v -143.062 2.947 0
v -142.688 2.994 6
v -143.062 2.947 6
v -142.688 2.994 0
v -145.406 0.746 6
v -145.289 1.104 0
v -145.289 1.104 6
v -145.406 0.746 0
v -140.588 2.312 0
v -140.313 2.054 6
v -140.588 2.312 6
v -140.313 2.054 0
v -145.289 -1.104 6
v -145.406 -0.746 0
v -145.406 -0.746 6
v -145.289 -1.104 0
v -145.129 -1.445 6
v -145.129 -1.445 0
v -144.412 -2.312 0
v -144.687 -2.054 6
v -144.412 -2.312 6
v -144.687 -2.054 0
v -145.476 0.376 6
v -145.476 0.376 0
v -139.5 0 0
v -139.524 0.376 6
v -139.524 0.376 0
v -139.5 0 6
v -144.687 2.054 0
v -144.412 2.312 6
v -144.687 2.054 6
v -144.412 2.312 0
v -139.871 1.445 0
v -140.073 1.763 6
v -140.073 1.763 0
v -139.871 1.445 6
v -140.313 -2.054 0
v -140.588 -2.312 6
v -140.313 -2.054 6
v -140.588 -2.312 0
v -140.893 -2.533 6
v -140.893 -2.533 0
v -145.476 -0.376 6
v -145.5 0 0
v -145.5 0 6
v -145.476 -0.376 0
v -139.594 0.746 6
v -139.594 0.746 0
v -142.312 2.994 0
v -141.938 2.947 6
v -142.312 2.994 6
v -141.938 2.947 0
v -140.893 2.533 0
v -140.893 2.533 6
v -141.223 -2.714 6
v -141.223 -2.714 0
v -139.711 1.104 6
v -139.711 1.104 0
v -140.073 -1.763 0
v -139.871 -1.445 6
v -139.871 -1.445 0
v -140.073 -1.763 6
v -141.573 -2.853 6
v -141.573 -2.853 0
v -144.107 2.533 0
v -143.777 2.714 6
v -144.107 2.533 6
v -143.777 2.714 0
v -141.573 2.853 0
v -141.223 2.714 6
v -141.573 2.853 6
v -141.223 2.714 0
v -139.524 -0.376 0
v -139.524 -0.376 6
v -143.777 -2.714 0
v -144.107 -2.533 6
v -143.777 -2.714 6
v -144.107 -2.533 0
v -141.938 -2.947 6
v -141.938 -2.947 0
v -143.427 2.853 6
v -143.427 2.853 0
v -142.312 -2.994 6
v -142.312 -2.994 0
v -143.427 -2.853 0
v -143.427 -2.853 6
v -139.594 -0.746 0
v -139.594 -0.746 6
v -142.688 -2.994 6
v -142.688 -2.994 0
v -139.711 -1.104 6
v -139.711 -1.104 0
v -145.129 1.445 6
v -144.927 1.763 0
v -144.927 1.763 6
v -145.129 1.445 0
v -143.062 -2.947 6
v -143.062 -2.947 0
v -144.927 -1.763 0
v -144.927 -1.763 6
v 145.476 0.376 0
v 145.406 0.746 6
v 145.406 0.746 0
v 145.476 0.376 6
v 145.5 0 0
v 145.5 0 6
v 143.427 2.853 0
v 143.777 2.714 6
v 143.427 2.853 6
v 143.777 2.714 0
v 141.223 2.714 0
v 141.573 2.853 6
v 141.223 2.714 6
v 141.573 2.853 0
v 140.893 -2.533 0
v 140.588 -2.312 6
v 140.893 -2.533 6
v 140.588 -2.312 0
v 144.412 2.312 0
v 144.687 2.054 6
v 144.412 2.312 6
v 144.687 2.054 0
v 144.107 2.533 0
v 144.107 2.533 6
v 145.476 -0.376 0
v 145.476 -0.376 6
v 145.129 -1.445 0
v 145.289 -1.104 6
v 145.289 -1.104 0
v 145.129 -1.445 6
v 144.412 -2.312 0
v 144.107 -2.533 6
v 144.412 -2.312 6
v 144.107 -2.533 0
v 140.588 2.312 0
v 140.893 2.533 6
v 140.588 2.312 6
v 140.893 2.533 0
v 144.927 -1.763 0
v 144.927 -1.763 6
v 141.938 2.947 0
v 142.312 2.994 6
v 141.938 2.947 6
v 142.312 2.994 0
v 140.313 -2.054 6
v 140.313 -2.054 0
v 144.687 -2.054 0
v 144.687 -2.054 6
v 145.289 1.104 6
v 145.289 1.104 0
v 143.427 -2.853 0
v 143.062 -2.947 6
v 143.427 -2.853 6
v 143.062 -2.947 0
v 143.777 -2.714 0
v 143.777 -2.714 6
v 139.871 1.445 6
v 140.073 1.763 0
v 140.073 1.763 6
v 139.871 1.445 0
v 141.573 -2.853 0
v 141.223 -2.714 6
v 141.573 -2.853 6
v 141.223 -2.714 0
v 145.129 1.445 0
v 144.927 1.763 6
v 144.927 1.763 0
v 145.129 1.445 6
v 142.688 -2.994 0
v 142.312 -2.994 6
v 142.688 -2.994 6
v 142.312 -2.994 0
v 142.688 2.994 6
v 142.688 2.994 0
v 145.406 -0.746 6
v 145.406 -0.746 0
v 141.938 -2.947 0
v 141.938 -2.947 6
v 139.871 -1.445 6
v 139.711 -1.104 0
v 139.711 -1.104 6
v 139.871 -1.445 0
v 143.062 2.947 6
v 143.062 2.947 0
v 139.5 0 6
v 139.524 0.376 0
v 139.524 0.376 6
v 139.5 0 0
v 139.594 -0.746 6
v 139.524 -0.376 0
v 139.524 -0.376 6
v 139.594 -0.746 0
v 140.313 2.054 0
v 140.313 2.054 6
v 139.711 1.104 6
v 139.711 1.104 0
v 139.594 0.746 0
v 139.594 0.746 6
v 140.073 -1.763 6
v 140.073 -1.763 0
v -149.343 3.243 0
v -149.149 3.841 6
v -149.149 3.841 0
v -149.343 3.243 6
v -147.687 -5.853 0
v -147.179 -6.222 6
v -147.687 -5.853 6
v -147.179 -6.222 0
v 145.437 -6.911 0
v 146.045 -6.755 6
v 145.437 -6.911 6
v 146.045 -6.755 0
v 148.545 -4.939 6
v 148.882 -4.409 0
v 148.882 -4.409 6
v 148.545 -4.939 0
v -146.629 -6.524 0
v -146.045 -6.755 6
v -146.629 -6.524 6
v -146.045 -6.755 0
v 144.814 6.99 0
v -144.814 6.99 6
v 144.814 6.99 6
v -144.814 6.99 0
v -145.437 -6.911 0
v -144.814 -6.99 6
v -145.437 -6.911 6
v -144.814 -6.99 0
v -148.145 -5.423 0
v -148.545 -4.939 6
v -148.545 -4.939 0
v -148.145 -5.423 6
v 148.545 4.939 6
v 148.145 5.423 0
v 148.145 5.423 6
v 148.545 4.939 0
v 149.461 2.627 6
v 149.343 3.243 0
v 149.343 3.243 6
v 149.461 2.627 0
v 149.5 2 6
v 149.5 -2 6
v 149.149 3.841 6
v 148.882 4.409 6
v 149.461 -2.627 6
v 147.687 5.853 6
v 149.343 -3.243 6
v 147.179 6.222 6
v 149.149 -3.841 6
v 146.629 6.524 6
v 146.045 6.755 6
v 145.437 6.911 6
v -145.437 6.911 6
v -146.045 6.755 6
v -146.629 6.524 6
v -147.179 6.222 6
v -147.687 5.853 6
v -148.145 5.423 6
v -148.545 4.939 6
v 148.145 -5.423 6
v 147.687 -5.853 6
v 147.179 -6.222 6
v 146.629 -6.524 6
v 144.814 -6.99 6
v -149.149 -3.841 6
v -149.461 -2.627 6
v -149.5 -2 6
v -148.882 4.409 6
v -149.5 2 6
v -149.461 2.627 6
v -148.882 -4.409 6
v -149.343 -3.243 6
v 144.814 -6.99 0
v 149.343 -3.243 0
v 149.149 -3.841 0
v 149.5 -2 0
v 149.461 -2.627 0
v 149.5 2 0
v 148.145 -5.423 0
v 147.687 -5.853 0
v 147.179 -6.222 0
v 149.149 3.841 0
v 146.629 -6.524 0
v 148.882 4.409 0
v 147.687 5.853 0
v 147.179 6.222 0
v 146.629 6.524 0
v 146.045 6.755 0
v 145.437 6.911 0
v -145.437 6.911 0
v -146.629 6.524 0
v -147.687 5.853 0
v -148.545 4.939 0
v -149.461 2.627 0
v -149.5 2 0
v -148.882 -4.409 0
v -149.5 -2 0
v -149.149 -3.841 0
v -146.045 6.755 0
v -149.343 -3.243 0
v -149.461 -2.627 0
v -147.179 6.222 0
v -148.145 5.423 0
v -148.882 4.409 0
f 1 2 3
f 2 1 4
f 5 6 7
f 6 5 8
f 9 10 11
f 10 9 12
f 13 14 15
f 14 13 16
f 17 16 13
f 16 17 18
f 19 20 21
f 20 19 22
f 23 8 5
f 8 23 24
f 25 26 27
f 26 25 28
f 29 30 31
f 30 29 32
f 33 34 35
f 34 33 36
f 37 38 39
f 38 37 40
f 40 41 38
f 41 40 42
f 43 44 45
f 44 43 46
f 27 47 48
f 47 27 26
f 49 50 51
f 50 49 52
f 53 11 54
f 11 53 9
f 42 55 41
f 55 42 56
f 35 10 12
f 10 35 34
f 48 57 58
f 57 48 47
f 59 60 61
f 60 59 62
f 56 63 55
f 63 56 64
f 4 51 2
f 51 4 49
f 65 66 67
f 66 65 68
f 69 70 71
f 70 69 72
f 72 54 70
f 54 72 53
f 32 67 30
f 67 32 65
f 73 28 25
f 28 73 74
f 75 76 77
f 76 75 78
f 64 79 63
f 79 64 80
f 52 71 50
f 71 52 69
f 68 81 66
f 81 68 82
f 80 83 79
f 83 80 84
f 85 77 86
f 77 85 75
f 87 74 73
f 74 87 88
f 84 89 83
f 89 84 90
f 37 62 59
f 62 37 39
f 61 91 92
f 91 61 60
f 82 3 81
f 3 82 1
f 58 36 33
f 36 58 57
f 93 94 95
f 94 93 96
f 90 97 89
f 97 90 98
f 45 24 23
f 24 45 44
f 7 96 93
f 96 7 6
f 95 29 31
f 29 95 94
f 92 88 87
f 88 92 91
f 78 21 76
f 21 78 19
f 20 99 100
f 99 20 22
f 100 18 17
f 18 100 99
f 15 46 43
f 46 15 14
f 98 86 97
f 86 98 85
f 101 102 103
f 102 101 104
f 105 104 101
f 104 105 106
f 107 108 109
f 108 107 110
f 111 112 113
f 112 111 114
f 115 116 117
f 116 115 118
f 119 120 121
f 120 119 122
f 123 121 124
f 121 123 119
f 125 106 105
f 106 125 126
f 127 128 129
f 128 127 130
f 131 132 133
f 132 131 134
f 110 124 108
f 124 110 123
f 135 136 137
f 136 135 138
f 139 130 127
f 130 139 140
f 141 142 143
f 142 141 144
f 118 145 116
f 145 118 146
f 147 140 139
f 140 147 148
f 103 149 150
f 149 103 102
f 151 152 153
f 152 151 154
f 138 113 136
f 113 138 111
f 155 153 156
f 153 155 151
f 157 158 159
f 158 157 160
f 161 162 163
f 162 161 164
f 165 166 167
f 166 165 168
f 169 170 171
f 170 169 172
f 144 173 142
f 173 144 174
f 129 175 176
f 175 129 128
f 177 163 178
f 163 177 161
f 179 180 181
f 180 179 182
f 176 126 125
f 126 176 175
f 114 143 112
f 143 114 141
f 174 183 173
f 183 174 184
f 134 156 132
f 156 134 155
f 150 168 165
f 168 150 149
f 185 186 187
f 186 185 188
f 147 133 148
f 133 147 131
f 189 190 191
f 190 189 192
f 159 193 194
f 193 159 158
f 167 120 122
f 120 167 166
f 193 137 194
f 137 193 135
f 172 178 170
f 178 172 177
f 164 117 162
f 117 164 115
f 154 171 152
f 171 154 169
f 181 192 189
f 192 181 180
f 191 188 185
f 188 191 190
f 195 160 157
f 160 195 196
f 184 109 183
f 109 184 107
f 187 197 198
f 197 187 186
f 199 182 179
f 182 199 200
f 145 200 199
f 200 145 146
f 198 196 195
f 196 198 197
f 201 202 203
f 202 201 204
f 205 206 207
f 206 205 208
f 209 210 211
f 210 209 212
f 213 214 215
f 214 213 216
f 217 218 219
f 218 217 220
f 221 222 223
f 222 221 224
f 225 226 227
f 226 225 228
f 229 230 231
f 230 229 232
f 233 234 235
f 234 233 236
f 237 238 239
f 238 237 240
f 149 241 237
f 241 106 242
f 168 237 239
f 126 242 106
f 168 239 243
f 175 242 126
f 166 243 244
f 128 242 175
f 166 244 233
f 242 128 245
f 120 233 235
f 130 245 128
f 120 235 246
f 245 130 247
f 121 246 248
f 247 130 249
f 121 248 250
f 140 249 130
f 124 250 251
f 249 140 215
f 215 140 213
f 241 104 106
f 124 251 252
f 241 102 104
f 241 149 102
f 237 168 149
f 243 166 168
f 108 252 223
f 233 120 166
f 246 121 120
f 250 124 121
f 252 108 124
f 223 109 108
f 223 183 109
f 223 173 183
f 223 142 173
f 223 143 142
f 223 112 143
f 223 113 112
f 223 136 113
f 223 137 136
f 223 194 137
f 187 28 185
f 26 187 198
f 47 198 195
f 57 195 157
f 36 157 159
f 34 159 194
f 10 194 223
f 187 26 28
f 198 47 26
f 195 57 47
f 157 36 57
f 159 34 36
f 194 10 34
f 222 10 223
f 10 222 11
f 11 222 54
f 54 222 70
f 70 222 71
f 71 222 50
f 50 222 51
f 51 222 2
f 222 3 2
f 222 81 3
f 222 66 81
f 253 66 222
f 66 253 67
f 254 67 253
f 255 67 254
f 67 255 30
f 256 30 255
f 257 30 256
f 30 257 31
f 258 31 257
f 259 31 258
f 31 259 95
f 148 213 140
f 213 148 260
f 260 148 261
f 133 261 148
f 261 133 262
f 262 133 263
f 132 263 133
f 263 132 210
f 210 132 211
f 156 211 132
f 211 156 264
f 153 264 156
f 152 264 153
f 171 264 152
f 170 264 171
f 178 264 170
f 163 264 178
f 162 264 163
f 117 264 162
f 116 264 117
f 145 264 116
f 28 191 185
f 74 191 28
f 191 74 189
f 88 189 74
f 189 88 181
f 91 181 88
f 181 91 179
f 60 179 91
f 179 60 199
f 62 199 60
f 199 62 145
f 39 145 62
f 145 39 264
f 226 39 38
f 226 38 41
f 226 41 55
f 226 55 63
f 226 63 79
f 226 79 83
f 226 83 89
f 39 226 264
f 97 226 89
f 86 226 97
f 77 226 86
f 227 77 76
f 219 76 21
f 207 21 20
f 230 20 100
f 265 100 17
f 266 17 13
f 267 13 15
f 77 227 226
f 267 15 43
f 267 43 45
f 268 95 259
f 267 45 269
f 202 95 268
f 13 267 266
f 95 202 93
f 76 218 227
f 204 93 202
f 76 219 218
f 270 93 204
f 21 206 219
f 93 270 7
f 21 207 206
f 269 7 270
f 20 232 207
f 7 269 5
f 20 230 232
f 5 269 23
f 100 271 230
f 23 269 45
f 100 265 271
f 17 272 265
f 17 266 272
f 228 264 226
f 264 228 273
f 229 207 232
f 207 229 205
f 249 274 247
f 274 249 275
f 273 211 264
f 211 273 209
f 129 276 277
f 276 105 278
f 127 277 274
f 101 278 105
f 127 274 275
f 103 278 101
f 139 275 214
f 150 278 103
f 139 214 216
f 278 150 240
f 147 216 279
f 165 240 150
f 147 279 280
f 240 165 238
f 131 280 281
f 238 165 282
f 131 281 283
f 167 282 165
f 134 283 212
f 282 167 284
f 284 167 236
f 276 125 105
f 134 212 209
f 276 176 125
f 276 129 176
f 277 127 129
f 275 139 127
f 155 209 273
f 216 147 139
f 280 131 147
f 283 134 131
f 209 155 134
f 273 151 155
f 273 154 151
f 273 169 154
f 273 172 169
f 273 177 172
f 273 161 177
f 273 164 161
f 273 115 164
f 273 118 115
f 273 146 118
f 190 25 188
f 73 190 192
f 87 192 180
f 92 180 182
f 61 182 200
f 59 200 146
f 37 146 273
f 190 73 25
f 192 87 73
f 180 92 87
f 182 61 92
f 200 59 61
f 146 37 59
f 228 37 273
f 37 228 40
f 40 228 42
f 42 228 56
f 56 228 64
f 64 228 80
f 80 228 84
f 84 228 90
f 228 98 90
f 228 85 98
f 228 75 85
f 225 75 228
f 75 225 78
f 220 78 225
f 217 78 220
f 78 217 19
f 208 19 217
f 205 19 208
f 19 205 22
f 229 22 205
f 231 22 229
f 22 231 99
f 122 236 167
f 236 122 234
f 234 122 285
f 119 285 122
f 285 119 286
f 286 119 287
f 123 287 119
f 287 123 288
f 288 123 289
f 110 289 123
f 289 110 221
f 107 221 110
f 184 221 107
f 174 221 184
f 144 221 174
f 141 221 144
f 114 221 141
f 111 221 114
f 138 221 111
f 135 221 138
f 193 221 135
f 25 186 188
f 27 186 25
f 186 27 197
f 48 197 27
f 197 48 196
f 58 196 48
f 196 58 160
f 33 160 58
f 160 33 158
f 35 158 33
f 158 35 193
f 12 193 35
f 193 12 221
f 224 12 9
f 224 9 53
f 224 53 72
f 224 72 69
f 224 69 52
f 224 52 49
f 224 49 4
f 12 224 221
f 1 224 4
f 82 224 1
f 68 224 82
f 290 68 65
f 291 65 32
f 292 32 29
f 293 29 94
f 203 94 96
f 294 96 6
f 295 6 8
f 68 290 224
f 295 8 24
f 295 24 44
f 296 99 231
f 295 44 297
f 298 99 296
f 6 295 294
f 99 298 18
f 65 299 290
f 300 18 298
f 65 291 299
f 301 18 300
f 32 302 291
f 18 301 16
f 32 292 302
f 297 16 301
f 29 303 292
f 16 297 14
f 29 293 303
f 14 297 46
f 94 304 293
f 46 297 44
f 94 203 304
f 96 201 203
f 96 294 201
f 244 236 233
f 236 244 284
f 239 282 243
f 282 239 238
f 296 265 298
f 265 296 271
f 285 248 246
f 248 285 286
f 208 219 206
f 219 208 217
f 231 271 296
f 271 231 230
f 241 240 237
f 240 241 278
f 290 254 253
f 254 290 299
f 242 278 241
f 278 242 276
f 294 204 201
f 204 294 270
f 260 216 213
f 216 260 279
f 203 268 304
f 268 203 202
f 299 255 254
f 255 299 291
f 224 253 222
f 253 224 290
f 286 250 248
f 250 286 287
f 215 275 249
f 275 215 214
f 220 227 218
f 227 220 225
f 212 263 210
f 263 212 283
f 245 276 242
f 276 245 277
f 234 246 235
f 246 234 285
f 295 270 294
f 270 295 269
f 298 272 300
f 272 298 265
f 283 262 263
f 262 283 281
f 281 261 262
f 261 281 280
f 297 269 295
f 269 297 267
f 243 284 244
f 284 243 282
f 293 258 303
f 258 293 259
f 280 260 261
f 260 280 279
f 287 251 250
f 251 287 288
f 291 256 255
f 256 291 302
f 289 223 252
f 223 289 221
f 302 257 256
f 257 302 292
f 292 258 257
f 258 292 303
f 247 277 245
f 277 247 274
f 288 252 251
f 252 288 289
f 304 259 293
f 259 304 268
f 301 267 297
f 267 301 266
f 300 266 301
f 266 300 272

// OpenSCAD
$fn = 50;


difference() {
	union() {
		hull() {
			translate(v = [-144.5000000000, 2.0000000000, 0]) {
				cylinder(h = 6, r = 5);
			}
			translate(v = [144.5000000000, 2.0000000000, 0]) {
				cylinder(h = 6, r = 5);
			}
			translate(v = [-144.5000000000, -2.0000000000, 0]) {
				cylinder(h = 6, r = 5);
			}
			translate(v = [144.5000000000, -2.0000000000, 0]) {
				cylinder(h = 6, r = 5);
			}
		}
	}
	union() {
		translate(v = [-142.5000000000, 0.0000000000, -100.0000000000]) {
			cylinder(h = 200, r = 3.0000000000);
		}
		translate(v = [-142.5000000000, 0.0000000000, -100.0000000000]) {
			cylinder(h = 200, r = 3.0000000000);
		}
		translate(v = [142.5000000000, 0.0000000000, -100.0000000000]) {
			cylinder(h = 200, r = 3.0000000000);
		}
		translate(v = [142.5000000000, 0.0000000000, -100.0000000000]) {
			cylinder(h = 200, r = 3.0000000000);
		}
	}
}
